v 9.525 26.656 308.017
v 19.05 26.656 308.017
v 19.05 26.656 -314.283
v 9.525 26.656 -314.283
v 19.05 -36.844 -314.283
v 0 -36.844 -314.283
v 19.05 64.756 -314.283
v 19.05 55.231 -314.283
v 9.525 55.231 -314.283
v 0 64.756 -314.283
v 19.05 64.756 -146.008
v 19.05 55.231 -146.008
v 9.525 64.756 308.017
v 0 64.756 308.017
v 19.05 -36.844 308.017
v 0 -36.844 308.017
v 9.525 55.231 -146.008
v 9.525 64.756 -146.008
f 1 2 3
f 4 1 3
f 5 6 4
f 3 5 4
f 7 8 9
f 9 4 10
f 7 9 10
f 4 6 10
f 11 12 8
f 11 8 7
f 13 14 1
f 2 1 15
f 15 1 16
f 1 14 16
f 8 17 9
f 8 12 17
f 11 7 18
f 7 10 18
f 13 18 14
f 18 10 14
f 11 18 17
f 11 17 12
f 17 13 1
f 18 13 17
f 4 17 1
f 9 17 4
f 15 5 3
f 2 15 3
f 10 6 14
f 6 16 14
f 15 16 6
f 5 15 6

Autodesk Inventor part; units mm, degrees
ref_plane "YZ Plane" through (0, 0, 0) normal (1, 0, 0) x (0, 1, 0)
ref_plane "XZ Plane" through (0, 0, 0) normal (0, 1, 0) x (-1, 0, 0)
ref_plane "XY Plane" through (0, 0, 0) normal (0, 0, 1) x (1, 0, 0)
sketch "Sketch1" plane through (0, 0, 0) normal (1, 0, 0) x (0, 1, 0)
  line L0 (64.7557, 308.0174) -> (-36.8443, 308.0174)
  line L1 (-36.8443, 308.0174) -> (-36.8443, -314.2826)
  line L2 (-36.8443, -314.2826) -> (64.7557, -314.2826)
  line L3 (64.7557, -314.2826) -> (64.7557, 308.0174)
  dimension "d2" = 622.3
  dimension "d3" = 101.6
extrude "Board" add sketch "Sketch1" along normal blind 19.05
sketch "Sketch8" plane through (19.05, 0, 0) normal (1, 0, 0) x (0, 0, -1)
  line L0 (-308.0174, 55.2307) -> (314.2826, 55.2307)
  line L1 (314.2826, 55.2307) -> (314.2826, 45.7057)
  line L2 (314.2826, 45.7057) -> (-308.0174, 45.7057)
  line L3 (-308.0174, 45.7057) -> (-308.0174, 55.2307)
  line L4 (-308.0174, 64.7557) -> (-308.0174, -36.8443) projected
  line L5 (314.2826, -36.8443) -> (314.2826, 64.7557) projected
  line L6 (314.2826, 64.7557) -> (-308.0174, 64.7557) projected
  point P0 (0, 0)
  dimension "d22" = 9.525
  dimension "d23" = 9.525
extrude "Lenghtwise Dado for Base" cut sketch "Sketch8" against normal blind 9.525 contours L0 L1 L2 L3
sketch "Sketch 9" plane through (0, 64.7557, 308.0174) normal (0, 1, 0) x (1, 0, 0)
  line L0 (19.05, 0) -> (9.525, 0)
  line L1 (9.525, 0) -> (9.525, 454.025)
  line L2 (9.525, 454.025) -> (19.05, 454.025)
  line L3 (19.05, 454.025) -> (19.05, 0)
  line L4 (19.05, 622.3) -> (19.05, 0) projected
  line L5 (0, 622.3) -> (19.05, 622.3) projected
  line L6 (0, 0) -> (19.05, 0) projected
  point P0 (0, 308.0174)
  dimension "d26" = 454.025
  dimension "d27" = 9.525
extrude "Lengthwise stop dado for Sides" cut sketch "Sketch 9" against normal blind 9.525
sketch "Sketch12" plane through (19.05, 0, 0) normal (1, 0, 0) x (0, 0, -1)
  line L0 (-308.0174, 26.6557) -> (314.2826, 26.6557)
  line L1 (314.2826, 26.6557) -> (314.2826, 45.7057)
  line L2 (314.2826, 45.7057) -> (-308.0174, 45.7057)
  line L3 (-308.0174, 45.7057) -> (-308.0174, 26.6557)
  line L4 (314.2826, 45.7057) -> (-308.0174, 45.7057) projected
  line L5 (-308.0174, 45.7057) -> (-308.0174, -36.8443) projected
  line L6 (314.2826, -36.8443) -> (314.2826, 45.7057) projected
  point P0 (0, 0)
  dimension "d30" = 19.05
extrude "Lenghtwise full dado for base" cut sketch "Sketch12" against normal blind 9.525
properties part number "Base Runner Side Right"
